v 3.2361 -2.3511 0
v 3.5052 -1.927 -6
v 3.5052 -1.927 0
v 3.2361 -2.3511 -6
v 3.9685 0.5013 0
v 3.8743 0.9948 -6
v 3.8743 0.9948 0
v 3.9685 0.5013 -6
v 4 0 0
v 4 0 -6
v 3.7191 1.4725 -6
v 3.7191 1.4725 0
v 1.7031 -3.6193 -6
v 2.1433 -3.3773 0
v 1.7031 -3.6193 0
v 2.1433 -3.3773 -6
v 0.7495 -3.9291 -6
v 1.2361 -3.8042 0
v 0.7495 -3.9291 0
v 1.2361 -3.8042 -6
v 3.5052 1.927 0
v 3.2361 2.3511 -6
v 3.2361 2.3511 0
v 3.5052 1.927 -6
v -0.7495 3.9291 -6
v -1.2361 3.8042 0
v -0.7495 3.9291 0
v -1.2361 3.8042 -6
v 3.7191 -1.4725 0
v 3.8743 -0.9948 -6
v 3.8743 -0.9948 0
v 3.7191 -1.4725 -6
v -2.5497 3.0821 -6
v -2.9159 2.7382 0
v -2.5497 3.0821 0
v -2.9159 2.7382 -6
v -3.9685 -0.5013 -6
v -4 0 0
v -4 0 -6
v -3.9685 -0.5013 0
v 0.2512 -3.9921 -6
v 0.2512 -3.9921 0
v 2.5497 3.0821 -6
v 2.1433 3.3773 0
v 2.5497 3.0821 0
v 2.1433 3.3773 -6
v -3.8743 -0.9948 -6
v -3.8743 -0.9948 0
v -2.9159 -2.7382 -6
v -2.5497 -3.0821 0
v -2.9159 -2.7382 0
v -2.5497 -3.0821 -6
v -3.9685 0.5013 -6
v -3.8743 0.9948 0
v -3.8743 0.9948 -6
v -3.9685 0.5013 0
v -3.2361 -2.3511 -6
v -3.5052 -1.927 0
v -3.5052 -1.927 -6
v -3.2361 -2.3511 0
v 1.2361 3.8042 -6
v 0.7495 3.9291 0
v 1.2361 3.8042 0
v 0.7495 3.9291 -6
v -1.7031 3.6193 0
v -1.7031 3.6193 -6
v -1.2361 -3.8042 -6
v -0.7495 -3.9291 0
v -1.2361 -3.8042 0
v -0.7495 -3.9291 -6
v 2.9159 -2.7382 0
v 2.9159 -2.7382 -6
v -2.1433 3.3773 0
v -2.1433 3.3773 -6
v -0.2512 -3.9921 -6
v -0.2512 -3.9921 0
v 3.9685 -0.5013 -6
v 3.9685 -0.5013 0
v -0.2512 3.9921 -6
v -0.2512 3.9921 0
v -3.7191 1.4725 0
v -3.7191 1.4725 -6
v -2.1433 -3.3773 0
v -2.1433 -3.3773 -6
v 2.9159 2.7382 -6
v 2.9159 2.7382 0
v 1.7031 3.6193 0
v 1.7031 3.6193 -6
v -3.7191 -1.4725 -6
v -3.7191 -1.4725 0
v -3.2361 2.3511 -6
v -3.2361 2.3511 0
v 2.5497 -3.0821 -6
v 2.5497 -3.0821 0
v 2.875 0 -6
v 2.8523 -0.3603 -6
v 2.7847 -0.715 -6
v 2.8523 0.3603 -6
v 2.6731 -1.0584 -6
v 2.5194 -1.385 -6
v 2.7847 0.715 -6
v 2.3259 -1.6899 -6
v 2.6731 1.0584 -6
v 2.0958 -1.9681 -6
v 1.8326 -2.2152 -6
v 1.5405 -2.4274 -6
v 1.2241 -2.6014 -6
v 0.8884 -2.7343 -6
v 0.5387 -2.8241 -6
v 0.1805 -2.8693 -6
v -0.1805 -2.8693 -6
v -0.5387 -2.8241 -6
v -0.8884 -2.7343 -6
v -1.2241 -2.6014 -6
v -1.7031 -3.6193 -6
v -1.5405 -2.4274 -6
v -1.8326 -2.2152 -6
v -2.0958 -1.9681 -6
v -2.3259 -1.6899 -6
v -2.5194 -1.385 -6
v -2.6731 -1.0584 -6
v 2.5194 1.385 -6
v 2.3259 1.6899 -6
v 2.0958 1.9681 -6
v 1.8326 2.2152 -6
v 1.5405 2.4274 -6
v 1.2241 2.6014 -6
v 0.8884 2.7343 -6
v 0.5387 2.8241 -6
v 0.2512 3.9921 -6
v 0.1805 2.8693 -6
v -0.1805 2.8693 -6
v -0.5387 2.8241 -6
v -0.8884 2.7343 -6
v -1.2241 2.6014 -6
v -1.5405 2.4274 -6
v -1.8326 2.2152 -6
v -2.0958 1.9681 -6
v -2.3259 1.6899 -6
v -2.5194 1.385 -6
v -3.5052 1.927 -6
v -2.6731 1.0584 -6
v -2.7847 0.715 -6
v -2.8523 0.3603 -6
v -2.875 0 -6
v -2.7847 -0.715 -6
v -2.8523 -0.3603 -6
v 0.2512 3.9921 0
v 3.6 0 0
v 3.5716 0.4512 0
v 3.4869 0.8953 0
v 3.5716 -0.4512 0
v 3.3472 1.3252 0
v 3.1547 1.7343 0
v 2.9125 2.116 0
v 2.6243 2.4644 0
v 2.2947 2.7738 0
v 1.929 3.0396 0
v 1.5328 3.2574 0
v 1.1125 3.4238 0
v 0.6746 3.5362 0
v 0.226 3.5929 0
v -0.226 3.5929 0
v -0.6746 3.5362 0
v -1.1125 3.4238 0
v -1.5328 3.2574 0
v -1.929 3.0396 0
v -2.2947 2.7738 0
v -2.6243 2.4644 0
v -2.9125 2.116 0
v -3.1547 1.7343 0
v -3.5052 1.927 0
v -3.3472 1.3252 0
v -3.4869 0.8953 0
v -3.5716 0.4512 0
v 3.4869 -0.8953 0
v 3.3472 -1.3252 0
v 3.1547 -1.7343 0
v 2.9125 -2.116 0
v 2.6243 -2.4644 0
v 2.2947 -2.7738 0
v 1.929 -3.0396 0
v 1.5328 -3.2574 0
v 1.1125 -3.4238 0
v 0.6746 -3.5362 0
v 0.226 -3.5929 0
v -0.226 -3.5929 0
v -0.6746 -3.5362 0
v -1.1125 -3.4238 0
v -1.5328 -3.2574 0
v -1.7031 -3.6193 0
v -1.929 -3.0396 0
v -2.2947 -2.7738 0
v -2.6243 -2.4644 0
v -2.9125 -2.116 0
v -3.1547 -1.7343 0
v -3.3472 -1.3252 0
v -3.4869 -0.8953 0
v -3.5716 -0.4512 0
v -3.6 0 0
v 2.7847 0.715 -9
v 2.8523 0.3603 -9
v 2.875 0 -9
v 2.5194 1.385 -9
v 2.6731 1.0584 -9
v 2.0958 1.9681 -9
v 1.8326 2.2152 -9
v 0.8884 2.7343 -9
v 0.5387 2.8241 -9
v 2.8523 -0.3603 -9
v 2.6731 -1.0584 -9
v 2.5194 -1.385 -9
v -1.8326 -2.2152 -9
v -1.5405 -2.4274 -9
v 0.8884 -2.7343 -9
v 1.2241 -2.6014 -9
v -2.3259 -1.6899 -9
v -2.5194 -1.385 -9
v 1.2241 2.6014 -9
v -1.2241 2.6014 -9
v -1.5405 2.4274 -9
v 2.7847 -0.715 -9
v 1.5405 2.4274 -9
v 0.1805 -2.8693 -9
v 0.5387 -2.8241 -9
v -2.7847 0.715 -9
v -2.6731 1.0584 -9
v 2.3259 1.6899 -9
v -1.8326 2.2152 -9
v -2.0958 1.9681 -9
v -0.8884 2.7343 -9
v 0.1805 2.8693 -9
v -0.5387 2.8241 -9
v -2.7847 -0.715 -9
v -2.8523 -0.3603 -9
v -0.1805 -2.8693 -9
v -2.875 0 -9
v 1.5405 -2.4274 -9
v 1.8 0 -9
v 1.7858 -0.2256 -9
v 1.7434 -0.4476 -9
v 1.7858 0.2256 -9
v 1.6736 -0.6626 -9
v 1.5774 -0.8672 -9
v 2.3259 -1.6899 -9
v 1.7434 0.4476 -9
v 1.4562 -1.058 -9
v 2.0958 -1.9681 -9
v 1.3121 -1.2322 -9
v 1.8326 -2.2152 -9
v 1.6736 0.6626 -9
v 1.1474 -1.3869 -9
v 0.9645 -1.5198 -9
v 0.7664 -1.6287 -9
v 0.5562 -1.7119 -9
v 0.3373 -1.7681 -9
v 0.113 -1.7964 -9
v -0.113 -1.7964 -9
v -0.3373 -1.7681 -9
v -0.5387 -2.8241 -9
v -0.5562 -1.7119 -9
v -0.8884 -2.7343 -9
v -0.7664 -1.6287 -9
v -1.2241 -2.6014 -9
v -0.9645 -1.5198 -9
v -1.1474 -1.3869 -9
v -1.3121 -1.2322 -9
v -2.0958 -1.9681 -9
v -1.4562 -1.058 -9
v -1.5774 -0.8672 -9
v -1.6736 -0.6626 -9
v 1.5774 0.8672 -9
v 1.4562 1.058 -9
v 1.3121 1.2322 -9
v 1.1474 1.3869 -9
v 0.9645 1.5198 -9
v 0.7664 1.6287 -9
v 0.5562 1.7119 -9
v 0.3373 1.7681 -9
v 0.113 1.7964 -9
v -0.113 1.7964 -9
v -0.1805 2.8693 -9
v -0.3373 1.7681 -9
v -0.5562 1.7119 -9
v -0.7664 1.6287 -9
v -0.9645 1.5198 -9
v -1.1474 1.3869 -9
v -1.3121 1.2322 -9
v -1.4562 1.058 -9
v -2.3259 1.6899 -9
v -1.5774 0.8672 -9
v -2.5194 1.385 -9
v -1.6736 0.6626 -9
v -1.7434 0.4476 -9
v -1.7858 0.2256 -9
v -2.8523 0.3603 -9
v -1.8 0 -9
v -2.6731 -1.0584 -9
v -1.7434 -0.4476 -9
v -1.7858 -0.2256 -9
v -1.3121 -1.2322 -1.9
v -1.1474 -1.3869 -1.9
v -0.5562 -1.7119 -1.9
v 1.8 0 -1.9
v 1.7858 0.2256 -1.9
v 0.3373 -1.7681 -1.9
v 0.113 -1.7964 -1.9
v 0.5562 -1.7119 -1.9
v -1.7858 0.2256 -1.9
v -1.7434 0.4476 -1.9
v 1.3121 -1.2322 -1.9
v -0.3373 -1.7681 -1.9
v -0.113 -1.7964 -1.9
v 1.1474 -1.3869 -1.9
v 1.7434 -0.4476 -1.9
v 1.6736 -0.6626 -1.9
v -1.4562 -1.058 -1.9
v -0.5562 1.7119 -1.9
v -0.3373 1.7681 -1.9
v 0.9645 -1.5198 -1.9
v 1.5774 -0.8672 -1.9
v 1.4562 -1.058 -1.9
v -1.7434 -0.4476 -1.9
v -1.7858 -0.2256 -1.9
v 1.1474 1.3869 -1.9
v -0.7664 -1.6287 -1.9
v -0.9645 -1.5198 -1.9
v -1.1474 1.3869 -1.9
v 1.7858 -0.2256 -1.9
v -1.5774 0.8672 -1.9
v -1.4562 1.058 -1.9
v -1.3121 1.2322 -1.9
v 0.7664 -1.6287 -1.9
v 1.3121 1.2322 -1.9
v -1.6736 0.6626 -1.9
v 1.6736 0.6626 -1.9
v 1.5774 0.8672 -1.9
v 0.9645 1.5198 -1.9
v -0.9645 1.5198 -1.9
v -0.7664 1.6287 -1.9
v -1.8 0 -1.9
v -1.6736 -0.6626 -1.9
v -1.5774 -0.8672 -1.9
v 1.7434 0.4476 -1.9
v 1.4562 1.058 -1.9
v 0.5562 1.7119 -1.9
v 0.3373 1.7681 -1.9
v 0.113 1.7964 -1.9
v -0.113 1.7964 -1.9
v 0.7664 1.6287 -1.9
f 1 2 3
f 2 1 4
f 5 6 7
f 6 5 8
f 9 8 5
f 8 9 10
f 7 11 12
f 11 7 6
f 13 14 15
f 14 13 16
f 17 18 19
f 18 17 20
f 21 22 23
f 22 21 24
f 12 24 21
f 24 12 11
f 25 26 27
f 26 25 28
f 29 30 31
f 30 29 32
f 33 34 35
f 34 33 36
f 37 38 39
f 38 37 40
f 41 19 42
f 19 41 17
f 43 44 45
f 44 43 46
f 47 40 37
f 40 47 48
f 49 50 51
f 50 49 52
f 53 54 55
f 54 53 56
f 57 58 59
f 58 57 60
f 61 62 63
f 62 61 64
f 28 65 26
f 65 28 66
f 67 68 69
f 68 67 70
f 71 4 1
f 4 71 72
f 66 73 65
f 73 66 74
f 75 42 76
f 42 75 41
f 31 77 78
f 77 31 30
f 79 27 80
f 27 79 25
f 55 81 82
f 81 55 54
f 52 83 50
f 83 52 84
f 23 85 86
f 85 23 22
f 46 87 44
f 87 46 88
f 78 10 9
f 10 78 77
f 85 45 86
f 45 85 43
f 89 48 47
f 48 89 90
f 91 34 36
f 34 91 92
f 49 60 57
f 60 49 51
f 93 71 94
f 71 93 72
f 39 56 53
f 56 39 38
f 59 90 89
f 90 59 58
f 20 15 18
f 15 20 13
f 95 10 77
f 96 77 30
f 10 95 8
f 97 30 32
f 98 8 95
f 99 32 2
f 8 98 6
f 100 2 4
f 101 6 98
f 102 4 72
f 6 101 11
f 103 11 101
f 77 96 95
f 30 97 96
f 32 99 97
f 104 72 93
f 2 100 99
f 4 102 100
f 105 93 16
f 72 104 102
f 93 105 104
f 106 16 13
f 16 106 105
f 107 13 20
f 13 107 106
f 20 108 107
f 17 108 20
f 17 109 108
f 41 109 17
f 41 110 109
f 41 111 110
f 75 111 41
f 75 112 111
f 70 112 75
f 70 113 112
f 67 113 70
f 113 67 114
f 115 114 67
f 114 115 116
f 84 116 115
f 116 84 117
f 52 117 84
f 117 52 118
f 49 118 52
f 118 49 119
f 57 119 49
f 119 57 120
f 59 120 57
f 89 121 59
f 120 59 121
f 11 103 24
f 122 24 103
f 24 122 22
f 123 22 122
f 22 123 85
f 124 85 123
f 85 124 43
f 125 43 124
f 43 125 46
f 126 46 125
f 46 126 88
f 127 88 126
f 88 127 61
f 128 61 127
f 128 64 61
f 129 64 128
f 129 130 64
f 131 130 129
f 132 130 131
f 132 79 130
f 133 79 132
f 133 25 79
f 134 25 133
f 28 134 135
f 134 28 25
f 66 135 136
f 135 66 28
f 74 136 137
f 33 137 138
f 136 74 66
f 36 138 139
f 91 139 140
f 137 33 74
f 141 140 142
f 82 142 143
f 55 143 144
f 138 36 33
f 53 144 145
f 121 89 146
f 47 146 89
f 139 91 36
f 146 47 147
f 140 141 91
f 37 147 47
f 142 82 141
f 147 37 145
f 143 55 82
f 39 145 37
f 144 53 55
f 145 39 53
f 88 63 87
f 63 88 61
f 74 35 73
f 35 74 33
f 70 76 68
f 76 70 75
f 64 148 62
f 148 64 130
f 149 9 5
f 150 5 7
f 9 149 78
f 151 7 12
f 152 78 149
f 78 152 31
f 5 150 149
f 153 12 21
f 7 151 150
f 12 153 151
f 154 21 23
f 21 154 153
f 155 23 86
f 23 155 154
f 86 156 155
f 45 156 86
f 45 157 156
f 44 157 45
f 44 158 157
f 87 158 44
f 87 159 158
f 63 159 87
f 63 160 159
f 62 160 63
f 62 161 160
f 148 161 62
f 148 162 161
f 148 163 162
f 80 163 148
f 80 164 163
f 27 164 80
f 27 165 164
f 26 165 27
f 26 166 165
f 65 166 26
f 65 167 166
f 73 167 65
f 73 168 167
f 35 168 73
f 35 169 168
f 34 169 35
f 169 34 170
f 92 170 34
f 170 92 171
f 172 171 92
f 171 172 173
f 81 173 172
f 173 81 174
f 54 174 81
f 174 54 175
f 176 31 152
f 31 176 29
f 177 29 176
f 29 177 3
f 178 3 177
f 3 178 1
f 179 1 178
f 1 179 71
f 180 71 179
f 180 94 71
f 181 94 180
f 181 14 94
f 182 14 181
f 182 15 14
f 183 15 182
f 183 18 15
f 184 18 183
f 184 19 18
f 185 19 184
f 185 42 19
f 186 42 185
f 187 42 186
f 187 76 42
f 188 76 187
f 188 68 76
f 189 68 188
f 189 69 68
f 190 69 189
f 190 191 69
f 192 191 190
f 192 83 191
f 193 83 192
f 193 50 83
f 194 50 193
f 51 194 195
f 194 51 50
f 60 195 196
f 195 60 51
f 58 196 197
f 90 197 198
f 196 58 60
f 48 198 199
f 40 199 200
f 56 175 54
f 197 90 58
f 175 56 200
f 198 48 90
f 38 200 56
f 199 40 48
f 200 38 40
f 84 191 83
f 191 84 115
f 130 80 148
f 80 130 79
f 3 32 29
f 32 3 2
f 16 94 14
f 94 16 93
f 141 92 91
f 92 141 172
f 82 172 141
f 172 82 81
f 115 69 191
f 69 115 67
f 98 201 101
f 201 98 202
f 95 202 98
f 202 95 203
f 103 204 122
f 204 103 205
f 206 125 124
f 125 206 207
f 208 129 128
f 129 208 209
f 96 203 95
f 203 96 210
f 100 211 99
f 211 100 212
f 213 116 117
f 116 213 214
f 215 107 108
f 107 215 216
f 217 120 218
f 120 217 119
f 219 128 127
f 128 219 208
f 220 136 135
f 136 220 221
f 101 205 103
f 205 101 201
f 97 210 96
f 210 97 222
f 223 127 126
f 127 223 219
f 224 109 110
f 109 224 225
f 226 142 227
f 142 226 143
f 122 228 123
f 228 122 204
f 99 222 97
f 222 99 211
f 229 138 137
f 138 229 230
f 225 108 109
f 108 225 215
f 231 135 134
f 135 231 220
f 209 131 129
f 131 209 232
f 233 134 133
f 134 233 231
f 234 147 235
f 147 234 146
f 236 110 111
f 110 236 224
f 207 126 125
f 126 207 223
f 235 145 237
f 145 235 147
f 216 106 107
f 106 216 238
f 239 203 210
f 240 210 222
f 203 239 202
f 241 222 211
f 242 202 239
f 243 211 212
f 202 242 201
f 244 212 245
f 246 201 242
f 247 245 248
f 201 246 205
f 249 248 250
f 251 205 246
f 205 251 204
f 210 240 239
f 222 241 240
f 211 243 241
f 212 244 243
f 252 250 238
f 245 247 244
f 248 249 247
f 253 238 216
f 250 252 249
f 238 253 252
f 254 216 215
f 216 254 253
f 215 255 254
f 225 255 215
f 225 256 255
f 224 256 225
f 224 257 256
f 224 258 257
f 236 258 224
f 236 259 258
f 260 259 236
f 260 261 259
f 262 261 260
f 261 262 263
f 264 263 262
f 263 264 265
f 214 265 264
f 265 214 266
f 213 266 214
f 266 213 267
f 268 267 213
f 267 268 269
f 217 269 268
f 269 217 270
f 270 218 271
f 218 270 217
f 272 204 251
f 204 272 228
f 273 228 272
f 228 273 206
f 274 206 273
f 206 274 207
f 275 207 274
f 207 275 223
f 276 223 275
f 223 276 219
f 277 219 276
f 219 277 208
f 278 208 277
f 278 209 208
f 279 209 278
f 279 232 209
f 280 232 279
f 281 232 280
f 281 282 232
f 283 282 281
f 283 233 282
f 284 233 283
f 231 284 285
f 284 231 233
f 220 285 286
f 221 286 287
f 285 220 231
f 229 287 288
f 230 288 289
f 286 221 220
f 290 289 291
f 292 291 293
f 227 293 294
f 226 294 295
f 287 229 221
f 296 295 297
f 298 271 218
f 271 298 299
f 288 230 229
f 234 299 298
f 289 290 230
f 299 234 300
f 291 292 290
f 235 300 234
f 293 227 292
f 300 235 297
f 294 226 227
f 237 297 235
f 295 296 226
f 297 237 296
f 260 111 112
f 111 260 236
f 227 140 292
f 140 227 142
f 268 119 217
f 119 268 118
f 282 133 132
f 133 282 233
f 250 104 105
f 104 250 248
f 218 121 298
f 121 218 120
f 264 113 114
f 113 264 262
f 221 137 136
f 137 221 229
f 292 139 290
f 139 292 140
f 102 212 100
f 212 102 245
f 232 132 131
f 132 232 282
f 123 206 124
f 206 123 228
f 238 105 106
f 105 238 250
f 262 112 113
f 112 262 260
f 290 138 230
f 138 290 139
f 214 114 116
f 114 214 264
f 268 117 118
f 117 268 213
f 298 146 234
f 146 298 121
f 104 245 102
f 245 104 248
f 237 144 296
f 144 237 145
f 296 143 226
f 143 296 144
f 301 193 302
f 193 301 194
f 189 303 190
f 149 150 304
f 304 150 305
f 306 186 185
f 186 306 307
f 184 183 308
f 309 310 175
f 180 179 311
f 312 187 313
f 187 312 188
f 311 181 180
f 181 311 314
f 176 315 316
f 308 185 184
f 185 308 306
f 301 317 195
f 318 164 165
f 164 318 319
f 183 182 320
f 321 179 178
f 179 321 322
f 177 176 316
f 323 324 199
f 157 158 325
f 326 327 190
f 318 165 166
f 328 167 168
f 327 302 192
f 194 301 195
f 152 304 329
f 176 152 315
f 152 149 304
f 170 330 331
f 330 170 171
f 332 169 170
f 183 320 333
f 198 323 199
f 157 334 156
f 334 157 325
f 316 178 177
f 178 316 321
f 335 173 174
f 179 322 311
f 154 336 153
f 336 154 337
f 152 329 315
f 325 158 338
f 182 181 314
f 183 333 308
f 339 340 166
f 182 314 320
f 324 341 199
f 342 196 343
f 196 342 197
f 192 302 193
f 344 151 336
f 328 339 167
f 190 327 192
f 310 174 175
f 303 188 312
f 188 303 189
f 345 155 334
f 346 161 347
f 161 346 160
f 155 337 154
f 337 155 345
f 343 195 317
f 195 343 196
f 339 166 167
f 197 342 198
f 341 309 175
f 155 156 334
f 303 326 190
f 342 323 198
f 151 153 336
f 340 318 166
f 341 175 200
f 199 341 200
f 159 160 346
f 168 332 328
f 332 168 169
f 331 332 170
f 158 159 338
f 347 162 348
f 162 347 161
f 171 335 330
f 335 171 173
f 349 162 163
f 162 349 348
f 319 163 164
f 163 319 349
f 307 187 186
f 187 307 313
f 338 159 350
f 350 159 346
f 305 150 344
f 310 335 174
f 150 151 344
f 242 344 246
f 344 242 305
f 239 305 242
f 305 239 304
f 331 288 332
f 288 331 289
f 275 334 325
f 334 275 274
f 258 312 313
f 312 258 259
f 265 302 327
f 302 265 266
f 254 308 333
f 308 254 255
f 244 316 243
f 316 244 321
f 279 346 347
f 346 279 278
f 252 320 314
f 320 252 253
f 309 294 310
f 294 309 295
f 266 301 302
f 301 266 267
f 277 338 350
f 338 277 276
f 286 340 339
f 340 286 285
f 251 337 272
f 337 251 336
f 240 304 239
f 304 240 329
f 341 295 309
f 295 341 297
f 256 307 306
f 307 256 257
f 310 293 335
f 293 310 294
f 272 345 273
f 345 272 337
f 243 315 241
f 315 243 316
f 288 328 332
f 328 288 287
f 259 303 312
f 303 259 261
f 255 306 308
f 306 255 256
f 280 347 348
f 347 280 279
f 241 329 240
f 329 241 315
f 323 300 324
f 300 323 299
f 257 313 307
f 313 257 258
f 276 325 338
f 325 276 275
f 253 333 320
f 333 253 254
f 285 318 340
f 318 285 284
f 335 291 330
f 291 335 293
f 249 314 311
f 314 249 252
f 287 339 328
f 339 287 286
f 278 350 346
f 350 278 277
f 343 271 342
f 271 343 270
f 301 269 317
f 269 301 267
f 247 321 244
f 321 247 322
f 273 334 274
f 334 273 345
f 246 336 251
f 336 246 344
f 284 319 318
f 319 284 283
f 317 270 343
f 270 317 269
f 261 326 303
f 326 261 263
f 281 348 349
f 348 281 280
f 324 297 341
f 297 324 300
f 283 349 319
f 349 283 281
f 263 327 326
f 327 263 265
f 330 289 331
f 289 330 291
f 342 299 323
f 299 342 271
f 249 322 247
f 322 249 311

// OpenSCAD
$fn = 50;

difference() {
	union() {
		translate(v = [0, 0, -6.0]) {
			cylinder(h = 6, r = 4.0);
		}
		#translate(v = [0, 0, -9.0]) {
			cylinder(h = 9, r = 2.875);
		}
	}
	union() {
		translate(v = [0, 0, 0]) {
			rotate(a = [0, 0, 0]) {
				difference() {
					union() {
						translate(v = [0, 0, -9.0]) {
							cylinder(h = 9, r = 1.5);
						}
						translate(v = [0, 0, -1.9]) {
							cylinder(h = 1.9, r1 = 1.8, r2 = 3.6);
						}
						translate(v = [0, 0, -9.0]) {
							cylinder(h = 9, r = 1.8);
						}
						translate(v = [0, 0, -9.0]) {
							cylinder(h = 9, r = 1.5);
						}
					}
					union();
				}
			}
		}
	}
}
